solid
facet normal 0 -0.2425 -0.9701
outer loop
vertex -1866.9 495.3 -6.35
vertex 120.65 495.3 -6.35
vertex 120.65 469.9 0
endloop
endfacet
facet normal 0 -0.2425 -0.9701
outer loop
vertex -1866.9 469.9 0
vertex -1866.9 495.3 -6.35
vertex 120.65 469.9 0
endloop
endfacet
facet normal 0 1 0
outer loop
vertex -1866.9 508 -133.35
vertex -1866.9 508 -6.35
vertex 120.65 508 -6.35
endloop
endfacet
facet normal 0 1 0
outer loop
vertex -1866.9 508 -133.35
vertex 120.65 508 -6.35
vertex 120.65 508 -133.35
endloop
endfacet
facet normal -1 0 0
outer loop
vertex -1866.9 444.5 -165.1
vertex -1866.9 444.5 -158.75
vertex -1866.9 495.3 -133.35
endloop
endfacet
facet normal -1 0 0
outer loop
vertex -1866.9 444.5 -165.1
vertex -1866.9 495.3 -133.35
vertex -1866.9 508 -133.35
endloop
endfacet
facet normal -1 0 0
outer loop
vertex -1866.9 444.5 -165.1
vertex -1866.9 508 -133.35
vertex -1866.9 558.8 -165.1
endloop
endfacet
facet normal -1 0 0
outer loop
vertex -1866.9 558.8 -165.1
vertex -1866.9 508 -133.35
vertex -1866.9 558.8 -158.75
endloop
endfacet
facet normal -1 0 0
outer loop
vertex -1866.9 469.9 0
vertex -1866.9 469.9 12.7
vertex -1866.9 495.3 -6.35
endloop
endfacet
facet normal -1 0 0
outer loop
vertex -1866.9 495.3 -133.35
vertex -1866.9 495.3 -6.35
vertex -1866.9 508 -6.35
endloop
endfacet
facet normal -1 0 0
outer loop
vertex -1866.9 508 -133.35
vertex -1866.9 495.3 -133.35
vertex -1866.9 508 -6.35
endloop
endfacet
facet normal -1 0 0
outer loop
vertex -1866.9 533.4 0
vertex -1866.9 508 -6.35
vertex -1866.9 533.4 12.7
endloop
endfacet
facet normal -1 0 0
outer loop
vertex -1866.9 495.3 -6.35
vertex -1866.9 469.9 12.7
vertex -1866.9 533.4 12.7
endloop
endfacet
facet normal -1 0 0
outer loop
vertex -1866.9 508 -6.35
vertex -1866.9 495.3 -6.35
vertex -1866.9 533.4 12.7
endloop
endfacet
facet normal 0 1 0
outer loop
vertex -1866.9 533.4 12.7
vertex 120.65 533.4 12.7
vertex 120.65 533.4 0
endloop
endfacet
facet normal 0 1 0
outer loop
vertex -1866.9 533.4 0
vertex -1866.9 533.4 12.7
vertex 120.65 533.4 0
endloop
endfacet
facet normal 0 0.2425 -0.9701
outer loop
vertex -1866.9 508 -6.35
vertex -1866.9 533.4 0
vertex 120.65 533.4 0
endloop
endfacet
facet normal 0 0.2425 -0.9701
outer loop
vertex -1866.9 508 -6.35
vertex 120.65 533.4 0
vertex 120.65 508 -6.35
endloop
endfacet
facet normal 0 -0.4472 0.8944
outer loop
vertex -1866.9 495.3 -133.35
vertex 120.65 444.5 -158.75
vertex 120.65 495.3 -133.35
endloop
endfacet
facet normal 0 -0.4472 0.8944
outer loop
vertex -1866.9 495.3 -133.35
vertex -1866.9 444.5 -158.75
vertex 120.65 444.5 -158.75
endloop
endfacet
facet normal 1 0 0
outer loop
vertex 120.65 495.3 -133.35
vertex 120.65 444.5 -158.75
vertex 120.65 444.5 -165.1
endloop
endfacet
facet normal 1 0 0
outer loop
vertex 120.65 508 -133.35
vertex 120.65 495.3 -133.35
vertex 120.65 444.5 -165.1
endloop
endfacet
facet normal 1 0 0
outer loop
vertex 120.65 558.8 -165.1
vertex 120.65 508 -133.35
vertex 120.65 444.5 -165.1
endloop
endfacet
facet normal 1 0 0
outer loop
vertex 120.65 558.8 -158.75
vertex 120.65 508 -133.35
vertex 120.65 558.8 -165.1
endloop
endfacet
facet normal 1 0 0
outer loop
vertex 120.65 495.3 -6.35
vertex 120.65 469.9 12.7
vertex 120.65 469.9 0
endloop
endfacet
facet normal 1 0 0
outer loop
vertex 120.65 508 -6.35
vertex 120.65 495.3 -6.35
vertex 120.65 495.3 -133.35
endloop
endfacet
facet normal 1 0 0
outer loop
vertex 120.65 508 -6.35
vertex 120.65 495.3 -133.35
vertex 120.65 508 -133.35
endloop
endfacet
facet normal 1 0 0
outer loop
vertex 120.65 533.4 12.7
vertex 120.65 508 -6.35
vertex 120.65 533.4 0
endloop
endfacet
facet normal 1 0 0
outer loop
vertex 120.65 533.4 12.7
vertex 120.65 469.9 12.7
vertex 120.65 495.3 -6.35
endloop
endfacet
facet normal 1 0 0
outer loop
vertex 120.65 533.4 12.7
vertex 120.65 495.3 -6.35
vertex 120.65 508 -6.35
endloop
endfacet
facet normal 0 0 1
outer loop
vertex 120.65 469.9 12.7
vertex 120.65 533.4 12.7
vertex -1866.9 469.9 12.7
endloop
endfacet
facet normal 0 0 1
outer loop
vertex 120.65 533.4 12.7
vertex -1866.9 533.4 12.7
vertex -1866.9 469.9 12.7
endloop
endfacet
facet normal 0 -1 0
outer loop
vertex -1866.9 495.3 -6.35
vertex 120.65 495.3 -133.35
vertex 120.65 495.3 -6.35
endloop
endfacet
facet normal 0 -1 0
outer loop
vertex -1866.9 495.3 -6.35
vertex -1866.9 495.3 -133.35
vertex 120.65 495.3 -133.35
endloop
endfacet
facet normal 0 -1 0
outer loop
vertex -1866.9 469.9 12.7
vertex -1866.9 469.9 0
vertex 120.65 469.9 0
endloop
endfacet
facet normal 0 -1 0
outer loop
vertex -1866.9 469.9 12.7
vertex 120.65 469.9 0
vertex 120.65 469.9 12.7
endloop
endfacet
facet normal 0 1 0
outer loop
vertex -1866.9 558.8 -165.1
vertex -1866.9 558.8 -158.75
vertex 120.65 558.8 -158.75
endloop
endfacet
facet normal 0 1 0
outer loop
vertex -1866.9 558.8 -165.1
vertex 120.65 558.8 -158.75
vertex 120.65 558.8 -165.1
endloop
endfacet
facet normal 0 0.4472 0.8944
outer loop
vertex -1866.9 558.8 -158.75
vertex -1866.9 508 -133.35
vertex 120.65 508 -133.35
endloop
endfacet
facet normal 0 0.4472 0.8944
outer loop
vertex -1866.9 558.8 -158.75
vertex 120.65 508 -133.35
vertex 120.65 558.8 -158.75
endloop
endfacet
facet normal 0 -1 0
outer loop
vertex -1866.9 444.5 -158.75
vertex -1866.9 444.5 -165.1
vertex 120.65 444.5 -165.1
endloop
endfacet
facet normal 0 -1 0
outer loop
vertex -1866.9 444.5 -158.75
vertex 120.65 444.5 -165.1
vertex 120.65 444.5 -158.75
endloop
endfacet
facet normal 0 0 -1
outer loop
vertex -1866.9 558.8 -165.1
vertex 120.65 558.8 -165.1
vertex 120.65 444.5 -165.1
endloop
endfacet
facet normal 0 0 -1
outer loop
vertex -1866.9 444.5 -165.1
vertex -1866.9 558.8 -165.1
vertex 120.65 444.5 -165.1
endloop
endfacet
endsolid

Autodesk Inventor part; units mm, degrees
ref_plane "YZ Plane" through (0, 0, 0) normal (1, 0, 0) x (0, 1, 0)
ref_plane "XZ Plane" through (0, 0, 0) normal (0, 1, 0) x (-1, 0, 0)
ref_plane "XY Plane" through (0, 0, 0) normal (0, 0, 1) x (1, 0, 0)
sketch "Sketch1" plane through (0, -4876.8, 165.1) normal (1, 0, 0) x (0, 1, 0)
  line L0 (0, 0) -> (0, -127)
  line L1 (9753.6, 0) -> (9753.6, -127)
  line L2 (9753.6, -152.4) -> (0, -152.4)
  line L3 (5410.2, -152.4) -> (5410.2, -165.1)
  line L4 (5410.2, -165.1) -> (5384.8, -171.45)
  line L5 (5384.8, -171.45) -> (5384.8, -298.45)
  line L6 (5384.8, -298.45) -> (5435.6, -323.85)
  line L7 (5435.6, -323.85) -> (5435.6, -330.2)
  line L8 (5435.6, -330.2) -> (5321.3, -330.2)
  line L9 (5321.3, -330.2) -> (5321.3, -323.85)
  line L10 (5372.1, -298.45) -> (5372.1, -171.45)
  line L11 (5410.2, -152.4) -> (5346.7, -152.4)
  line L12 (5378.45, -325.0091) -> (5378.45, -152.4) construction
  line L13 (5372.1, -171.45) -> (5346.7, -165.1)
  line L14 (5346.7, -165.1) -> (5346.7, -152.4)
  line L15 (5372.1, -298.45) -> (5384.8, -298.45) construction
  line L16 (5321.3, -323.85) -> (5372.1, -298.45)
  point P0 (9753.6, -50.8)
  point P1 (9753.6, -63.5)
  dimension "d8" = 12.7
  dimension "d6" = 6.35
  dimension "d17" = 6.35
  dimension "d12" = 6.35
  dimension "d14" = 50.8
  dimension "d13" = 25.4
  dimension "d16" = 25.4
  dimension "d5" = 25.4
  dimension "d11" = 6.35
  dimension "d10" = 50.8
  dimension "d3" = 90
  dimension "d15" = 127
  dimension "d7" = 177.8
  dimension "d9" = 127
  dimension "d4" = 6.35
  dimension "d2" = 4368.8
extrude "Extrusion1" add sketch "Sketch1" along normal blind 120.65 and the other way blind 1866.9
properties part number "Short I-Beam" material "Steel ASTM A36"
